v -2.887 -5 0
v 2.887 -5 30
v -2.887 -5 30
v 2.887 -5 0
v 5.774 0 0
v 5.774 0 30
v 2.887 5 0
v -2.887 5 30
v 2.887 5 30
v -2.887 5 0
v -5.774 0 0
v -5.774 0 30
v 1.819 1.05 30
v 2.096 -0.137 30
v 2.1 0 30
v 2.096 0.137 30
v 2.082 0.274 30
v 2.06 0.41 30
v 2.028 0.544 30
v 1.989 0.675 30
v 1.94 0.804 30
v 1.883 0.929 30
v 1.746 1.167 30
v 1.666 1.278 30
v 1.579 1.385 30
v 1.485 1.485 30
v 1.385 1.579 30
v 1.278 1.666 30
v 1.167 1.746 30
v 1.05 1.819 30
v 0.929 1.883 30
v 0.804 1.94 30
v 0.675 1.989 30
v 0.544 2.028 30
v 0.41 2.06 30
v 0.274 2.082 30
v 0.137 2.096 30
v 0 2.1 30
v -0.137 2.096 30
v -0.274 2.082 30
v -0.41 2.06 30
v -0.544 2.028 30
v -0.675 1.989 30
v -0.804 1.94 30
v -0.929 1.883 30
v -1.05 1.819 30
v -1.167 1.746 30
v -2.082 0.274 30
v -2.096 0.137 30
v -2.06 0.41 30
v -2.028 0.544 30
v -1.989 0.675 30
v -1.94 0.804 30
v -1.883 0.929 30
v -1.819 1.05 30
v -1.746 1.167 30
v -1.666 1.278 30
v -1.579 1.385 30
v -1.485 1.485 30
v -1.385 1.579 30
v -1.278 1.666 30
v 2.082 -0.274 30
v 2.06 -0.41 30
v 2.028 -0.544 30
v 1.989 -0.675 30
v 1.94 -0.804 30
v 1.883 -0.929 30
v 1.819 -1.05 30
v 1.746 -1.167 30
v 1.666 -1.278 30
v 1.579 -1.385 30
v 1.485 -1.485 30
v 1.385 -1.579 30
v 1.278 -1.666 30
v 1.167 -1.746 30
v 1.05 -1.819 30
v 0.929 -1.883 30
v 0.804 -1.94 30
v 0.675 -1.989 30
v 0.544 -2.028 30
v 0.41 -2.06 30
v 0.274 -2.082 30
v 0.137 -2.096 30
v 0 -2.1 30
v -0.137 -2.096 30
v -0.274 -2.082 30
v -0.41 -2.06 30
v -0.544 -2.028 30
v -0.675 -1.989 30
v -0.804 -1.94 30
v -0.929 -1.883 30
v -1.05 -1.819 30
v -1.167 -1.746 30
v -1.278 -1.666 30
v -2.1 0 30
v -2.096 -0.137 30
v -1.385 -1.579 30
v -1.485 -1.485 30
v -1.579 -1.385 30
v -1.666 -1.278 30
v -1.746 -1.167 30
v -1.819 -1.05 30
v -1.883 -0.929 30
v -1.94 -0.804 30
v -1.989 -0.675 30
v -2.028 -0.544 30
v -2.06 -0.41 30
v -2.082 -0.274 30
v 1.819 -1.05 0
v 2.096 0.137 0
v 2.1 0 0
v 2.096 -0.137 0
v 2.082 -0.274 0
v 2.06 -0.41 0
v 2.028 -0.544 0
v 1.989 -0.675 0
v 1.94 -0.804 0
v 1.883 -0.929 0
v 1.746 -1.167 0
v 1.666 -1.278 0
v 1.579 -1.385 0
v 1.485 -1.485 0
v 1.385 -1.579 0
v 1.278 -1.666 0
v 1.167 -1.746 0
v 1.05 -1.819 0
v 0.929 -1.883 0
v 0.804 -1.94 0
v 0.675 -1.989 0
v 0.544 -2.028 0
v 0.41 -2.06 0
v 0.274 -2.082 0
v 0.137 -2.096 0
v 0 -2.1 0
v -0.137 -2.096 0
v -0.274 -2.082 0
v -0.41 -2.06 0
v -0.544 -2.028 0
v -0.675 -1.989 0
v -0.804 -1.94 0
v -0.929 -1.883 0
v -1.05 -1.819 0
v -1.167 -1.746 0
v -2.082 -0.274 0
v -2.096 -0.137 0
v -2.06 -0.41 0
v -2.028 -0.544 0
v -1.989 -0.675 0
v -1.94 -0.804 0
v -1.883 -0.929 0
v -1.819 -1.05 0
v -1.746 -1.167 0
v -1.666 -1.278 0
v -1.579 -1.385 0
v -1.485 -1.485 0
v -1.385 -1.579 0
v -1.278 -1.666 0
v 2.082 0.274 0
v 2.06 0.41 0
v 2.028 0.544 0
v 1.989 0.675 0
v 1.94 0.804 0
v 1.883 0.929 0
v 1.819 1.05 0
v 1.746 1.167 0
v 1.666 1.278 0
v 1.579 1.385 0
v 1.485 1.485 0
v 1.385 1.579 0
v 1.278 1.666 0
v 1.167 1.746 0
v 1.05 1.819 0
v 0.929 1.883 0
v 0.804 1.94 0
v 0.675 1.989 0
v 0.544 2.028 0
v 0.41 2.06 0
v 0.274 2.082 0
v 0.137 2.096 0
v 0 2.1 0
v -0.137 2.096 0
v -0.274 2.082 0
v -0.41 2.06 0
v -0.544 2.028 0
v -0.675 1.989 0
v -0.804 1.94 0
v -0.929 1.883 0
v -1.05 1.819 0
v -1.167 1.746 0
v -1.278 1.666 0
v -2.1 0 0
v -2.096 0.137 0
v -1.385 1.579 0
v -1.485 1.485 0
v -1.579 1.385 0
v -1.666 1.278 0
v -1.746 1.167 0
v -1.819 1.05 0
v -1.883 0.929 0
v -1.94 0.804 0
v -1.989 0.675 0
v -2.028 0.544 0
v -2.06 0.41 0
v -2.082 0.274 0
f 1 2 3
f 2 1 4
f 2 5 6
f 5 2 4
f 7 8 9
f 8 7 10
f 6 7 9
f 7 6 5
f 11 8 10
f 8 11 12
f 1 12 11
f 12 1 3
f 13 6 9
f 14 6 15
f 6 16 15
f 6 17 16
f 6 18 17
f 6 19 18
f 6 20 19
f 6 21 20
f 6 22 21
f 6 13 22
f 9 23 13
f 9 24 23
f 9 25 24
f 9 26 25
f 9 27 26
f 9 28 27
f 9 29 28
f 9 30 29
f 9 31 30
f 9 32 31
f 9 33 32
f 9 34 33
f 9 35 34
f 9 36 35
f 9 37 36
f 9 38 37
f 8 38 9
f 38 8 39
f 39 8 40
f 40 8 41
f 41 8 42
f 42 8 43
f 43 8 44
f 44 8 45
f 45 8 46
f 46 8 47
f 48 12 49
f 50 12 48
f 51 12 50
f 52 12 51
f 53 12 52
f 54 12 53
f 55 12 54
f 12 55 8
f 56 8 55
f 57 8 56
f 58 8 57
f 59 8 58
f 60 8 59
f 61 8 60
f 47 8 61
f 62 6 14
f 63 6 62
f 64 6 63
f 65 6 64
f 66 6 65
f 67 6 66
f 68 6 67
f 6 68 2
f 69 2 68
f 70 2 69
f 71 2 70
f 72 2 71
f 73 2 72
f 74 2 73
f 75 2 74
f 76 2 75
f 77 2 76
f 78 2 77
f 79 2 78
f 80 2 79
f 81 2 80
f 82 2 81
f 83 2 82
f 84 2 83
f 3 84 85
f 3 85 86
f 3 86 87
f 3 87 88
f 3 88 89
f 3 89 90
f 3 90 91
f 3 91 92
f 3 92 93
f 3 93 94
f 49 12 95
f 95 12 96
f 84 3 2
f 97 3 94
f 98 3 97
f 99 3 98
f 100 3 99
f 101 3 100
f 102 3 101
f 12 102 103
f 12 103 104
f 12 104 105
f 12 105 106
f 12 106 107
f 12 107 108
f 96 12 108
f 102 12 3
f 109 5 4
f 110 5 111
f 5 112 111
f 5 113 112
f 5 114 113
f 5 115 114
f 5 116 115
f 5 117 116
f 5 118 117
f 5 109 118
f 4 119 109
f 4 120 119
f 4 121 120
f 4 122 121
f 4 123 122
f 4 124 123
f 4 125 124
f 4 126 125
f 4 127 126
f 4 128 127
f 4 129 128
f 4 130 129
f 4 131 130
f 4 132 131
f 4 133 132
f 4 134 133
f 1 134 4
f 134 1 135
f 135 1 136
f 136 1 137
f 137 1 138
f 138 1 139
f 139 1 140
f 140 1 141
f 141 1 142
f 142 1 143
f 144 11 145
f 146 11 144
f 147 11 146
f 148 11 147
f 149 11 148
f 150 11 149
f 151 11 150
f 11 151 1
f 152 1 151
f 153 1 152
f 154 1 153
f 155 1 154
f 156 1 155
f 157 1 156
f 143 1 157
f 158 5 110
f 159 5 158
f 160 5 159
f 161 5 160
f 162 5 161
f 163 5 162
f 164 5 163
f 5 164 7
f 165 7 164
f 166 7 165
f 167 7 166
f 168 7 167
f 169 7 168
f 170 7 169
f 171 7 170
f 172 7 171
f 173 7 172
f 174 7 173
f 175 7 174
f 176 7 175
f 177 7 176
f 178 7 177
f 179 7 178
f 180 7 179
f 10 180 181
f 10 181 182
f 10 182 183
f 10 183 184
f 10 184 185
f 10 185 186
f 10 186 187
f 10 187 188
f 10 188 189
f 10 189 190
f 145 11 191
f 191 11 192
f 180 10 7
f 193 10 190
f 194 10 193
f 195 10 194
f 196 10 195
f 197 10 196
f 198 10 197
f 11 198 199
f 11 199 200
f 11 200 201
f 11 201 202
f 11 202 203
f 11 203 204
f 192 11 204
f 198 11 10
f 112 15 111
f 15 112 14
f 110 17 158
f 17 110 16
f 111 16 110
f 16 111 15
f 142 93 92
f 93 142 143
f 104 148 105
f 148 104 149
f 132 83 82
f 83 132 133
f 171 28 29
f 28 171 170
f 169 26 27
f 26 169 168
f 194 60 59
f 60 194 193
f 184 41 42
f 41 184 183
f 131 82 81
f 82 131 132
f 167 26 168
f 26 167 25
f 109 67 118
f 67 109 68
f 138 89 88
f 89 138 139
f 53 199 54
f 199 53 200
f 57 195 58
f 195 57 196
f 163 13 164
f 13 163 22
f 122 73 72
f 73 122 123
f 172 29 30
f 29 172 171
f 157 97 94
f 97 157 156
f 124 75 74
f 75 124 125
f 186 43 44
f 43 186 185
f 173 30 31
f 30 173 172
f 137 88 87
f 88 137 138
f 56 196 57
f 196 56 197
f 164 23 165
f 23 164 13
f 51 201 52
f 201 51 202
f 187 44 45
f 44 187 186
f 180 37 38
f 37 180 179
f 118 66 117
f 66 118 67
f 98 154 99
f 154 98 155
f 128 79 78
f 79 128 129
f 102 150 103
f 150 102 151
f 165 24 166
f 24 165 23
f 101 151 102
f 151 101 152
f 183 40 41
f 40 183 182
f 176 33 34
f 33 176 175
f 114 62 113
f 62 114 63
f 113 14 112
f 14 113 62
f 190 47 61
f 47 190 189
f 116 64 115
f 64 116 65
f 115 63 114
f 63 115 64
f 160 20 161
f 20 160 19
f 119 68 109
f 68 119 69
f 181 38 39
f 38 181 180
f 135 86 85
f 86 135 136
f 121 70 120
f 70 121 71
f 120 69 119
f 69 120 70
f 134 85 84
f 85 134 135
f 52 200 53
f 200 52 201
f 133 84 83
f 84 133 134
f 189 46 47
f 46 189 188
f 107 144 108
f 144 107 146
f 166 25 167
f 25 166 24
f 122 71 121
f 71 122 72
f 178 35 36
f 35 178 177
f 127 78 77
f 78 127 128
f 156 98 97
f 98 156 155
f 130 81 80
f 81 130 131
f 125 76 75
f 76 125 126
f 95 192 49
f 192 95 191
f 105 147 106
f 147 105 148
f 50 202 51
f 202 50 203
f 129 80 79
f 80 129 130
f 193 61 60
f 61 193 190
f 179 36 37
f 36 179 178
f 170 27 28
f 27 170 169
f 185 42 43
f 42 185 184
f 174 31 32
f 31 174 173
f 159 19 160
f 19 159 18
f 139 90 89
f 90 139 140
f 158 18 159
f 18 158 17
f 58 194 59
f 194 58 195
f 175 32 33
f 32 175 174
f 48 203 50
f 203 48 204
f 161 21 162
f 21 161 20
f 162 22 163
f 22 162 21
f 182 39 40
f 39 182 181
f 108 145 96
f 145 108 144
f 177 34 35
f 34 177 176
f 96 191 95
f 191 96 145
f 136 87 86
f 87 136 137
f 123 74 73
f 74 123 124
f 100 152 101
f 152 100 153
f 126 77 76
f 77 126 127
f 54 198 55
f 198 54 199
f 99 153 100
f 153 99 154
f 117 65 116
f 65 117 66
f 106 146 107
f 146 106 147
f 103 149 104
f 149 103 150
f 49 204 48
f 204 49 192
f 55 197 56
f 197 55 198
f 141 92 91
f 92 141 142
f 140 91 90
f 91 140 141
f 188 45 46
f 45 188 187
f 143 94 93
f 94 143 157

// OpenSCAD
across_flats = 10; length = 30; bore_diameter = 4.2;
difference() {
  // $fn=6 puts a vertex on +X, so the flats are perpendicular to Y
  cylinder(r = across_flats / 2 / cos(30), h = length, $fn = 6);
  translate([0, 0, -1]) cylinder(d = bore_diameter, h = length + 2, $fn = 96);
}
